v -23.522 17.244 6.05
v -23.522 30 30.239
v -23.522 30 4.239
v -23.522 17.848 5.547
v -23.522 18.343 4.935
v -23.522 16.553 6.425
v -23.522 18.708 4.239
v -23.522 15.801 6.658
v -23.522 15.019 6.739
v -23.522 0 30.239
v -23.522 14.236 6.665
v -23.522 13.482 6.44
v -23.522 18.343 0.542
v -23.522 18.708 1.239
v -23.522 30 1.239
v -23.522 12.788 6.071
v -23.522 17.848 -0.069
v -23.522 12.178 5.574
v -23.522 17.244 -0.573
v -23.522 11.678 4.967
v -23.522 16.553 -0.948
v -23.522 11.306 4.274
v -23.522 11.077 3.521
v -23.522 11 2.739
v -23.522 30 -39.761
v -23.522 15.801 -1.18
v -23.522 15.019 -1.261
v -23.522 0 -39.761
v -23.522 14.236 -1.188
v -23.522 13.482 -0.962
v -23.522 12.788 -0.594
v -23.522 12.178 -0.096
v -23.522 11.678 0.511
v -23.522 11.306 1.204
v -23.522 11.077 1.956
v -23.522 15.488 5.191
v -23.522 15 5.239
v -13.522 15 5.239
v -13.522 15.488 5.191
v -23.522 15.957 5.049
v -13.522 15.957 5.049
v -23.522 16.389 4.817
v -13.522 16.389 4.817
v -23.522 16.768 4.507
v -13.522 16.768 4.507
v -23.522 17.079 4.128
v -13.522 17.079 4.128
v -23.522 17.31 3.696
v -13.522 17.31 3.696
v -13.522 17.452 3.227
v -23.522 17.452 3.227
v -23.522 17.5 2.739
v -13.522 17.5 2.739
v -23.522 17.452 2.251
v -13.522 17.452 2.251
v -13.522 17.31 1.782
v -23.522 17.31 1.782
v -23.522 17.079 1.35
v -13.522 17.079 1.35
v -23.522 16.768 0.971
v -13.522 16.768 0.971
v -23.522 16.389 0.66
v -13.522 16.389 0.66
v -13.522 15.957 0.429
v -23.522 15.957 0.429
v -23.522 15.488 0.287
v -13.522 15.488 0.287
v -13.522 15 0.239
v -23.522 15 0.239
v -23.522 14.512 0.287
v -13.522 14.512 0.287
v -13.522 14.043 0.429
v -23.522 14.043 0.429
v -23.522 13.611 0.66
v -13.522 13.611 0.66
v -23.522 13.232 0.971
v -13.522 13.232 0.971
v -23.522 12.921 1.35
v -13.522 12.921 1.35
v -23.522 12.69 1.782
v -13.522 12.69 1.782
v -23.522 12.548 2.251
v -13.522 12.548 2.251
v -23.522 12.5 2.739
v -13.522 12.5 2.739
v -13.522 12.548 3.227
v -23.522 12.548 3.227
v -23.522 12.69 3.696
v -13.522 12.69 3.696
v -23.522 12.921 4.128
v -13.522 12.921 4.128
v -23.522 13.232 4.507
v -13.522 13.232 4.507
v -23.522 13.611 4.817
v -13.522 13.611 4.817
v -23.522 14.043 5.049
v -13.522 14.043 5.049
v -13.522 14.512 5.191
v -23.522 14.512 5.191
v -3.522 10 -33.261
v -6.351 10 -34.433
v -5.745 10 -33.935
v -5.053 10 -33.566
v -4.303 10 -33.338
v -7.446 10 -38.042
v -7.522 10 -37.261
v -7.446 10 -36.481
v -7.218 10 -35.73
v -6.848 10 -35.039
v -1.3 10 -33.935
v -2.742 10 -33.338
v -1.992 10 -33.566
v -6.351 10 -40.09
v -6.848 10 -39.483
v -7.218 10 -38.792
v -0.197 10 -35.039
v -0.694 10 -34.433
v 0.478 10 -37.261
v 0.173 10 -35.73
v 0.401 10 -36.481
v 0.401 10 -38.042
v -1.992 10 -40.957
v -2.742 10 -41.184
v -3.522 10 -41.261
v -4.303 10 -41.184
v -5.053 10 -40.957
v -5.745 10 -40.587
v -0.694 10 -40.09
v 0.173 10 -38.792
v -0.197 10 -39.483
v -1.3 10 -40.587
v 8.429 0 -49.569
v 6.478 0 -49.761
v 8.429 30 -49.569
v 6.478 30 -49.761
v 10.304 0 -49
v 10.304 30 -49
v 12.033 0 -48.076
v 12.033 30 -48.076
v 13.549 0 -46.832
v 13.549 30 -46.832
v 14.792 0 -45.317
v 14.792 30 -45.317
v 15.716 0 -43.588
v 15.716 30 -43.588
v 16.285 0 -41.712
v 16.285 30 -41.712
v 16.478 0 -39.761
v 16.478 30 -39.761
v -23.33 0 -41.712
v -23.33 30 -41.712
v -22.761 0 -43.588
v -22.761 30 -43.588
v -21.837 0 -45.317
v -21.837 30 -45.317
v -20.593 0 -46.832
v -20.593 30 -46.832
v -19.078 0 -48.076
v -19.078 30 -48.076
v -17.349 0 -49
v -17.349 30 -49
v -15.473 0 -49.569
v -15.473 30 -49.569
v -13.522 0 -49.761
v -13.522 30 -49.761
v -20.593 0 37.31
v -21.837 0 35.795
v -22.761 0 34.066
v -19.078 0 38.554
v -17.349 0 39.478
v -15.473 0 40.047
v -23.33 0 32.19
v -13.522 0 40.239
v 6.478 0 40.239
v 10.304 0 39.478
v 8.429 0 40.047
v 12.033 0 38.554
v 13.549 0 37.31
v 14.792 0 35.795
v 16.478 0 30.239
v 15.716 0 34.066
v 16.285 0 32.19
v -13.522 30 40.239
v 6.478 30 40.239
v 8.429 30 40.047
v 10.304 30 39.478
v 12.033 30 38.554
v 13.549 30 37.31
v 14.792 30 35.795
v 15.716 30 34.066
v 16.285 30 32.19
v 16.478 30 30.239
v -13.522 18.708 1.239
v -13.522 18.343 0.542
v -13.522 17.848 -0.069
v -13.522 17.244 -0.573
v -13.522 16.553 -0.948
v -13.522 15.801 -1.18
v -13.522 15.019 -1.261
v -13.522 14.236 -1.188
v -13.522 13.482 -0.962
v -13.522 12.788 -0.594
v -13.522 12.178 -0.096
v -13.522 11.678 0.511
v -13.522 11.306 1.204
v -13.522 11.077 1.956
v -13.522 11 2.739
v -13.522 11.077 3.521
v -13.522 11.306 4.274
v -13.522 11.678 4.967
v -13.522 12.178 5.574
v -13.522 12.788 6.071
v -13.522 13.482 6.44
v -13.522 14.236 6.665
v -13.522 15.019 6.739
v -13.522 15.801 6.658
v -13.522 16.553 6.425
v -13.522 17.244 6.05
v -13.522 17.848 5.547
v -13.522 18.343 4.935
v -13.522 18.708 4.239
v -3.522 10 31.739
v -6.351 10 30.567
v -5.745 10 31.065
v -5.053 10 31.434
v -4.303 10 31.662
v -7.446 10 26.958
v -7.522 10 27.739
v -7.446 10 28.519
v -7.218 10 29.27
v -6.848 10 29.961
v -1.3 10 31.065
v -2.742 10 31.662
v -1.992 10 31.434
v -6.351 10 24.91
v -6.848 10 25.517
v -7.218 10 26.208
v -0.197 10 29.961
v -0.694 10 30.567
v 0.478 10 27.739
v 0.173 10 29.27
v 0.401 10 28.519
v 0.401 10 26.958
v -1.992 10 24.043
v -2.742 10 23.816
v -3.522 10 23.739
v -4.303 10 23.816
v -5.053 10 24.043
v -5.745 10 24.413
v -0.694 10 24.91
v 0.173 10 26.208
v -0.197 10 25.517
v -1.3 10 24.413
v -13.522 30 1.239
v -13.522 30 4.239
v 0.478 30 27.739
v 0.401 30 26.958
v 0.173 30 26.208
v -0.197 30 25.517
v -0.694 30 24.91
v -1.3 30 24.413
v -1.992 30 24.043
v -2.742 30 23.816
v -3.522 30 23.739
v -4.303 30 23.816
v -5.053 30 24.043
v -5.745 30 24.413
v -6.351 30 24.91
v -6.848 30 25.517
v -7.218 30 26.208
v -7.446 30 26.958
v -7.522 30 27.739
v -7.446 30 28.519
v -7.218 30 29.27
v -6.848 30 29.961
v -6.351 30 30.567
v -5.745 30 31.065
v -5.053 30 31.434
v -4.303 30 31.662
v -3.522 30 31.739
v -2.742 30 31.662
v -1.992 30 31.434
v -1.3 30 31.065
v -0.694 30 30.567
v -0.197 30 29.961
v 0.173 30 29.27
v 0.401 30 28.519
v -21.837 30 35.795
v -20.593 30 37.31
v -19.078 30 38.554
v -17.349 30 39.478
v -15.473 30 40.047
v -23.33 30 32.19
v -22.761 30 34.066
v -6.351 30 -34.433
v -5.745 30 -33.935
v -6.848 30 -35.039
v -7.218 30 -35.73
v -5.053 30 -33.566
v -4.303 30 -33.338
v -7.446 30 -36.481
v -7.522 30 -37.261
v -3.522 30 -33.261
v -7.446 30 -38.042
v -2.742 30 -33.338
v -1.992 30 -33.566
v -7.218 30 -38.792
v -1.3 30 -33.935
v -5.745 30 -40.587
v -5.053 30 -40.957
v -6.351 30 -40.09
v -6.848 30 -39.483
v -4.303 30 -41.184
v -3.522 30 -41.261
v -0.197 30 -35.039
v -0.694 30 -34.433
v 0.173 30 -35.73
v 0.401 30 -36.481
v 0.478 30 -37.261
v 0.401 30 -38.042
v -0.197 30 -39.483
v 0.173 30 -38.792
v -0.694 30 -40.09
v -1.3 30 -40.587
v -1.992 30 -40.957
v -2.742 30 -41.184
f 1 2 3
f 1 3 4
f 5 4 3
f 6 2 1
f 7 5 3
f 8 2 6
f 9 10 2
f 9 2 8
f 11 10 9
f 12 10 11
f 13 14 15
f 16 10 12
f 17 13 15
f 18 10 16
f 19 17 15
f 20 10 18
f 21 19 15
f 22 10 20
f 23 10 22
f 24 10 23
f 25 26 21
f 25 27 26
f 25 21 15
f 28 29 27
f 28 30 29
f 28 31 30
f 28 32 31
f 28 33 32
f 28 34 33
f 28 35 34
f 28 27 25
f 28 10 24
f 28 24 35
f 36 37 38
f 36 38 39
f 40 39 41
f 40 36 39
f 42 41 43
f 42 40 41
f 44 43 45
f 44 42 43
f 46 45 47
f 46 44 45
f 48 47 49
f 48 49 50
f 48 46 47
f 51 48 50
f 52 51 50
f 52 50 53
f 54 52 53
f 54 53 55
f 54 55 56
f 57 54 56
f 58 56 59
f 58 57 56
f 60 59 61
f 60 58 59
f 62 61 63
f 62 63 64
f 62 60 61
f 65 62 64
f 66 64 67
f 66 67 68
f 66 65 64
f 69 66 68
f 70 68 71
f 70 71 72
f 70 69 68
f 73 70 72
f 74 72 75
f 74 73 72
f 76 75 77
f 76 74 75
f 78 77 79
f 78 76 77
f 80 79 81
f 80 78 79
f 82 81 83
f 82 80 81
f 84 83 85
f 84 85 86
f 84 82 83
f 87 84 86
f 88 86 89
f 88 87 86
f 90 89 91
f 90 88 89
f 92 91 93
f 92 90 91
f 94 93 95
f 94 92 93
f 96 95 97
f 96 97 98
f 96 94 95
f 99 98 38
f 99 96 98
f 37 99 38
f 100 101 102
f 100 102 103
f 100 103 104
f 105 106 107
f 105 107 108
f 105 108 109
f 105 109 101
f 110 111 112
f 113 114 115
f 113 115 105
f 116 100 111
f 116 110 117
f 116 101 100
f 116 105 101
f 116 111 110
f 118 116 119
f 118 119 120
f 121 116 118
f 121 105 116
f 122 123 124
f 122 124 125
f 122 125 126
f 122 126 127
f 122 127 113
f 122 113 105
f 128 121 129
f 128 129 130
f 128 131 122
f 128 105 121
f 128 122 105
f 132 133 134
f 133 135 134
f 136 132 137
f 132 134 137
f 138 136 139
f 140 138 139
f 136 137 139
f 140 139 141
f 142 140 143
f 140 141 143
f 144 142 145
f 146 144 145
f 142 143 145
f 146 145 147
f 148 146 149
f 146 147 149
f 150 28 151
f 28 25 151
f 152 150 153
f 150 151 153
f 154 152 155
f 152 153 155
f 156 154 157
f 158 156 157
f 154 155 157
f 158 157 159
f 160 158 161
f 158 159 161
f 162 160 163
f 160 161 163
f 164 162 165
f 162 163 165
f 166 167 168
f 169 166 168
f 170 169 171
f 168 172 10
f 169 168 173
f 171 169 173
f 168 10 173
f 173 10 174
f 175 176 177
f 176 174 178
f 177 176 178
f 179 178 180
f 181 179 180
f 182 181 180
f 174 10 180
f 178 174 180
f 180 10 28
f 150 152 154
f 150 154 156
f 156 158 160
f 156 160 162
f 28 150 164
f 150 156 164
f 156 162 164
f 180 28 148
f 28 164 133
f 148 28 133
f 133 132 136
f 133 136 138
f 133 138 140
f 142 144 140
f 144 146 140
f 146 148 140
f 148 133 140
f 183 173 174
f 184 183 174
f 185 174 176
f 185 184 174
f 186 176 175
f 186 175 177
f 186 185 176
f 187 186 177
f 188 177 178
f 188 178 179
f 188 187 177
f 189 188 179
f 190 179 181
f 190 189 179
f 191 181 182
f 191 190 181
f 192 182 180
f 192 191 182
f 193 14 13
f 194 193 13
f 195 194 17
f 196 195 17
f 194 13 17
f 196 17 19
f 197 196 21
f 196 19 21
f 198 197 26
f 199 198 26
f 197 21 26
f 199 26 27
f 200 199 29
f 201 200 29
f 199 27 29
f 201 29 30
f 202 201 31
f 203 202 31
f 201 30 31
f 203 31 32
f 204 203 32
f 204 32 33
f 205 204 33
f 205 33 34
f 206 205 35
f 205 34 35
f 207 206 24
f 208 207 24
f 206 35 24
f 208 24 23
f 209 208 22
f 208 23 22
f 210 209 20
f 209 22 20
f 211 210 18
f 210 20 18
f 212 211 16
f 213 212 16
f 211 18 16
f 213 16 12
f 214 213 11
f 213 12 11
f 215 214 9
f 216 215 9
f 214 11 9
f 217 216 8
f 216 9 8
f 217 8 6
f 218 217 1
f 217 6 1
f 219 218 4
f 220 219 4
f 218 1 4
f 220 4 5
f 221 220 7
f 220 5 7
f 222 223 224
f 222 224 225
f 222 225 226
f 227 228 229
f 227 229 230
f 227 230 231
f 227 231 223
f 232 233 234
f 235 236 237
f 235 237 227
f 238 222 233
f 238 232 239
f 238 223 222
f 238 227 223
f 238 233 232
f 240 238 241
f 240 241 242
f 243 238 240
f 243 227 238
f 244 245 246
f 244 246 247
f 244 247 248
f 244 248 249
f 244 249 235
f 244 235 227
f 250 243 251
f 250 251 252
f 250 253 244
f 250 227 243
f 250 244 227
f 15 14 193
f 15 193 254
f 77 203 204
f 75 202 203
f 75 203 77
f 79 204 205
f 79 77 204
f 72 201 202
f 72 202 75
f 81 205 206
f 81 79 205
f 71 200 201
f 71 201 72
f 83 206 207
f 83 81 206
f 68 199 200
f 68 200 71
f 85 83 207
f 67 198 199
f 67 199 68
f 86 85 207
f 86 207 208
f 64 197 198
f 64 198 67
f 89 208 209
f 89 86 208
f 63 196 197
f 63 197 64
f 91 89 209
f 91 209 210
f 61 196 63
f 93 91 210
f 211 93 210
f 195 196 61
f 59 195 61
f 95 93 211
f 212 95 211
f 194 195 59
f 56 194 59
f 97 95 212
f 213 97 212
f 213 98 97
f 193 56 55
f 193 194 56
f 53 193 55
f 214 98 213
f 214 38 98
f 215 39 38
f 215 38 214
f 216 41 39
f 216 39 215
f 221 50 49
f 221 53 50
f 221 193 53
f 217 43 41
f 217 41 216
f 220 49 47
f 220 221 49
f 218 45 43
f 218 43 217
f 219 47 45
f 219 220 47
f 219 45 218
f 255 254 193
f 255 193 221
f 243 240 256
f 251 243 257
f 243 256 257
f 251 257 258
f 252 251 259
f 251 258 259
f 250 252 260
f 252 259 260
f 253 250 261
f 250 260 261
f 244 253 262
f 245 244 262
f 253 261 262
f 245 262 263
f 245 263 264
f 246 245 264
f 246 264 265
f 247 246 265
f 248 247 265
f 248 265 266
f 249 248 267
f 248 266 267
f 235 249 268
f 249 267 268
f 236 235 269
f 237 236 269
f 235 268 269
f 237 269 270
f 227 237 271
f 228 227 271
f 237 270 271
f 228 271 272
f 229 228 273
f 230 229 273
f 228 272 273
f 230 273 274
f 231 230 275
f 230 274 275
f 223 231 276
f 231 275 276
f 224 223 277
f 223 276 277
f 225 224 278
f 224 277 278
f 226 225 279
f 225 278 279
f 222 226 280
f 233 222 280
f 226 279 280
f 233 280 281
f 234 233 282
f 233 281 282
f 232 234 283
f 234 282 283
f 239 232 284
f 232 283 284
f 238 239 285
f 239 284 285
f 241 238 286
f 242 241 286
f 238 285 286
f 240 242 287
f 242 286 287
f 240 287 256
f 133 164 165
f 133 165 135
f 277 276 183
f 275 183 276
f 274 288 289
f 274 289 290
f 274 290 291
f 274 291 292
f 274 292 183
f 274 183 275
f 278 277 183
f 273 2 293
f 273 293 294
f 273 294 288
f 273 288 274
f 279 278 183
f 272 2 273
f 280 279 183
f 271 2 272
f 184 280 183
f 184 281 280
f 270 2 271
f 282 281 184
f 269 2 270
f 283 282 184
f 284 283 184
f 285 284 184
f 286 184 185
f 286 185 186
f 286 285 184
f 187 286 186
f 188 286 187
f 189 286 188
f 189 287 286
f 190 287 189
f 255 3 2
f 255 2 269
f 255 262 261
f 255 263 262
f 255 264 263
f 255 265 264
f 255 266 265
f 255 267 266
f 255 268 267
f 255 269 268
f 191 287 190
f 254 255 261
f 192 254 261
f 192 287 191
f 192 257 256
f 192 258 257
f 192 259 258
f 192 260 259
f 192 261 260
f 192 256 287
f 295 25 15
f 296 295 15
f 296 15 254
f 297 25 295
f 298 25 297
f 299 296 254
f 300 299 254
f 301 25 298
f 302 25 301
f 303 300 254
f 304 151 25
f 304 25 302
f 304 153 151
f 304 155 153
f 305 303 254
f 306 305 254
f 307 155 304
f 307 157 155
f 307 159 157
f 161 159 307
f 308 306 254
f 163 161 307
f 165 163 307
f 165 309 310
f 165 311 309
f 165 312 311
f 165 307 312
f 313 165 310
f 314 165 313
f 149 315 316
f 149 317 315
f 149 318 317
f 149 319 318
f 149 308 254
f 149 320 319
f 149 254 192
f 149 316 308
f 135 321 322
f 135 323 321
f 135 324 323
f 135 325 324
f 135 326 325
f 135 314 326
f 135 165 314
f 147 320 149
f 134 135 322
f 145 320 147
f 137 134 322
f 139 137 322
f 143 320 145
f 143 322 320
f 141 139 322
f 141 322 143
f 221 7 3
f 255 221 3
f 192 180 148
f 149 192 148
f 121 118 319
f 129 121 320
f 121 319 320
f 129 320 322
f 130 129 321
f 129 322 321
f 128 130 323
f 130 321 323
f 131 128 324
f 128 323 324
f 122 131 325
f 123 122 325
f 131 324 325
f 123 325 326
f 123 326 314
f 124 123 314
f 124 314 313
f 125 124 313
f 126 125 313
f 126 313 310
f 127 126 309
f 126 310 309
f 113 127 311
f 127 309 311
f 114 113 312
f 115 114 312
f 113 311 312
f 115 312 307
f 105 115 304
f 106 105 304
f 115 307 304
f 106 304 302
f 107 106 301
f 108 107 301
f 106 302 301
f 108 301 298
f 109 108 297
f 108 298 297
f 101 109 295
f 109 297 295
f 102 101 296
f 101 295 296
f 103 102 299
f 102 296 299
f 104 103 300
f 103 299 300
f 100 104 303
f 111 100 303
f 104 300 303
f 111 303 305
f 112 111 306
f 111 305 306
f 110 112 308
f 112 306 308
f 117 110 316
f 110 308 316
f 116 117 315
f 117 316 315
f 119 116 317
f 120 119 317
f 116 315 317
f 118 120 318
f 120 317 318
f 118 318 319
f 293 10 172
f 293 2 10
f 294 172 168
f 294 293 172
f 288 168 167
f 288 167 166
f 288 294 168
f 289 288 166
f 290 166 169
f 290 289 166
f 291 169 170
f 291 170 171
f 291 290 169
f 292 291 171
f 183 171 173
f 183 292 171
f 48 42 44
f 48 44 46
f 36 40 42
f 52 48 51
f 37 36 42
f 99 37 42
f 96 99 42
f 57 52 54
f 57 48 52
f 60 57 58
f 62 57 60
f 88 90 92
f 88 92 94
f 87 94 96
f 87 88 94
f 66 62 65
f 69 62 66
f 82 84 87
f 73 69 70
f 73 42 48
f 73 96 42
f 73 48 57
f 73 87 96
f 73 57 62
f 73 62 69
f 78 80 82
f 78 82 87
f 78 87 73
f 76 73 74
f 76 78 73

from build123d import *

# Parameters (mm, degrees)
SKETCH2_W           = 40
SKETCH2_H           = 90
BOSS_EXTRUDE1_DEPTH = 30
SKETCH3_R           = 4
CUT_EXTRUDE1_DEPTH  = 20
SKETCH4_R           = 4
SKETCH4_R_2         = 2.5
SKETCH4_W           = 3
SKETCH4_H           = 12
CUT_EXTRUDE2_DEPTH  = 10
FILLET1_R           = 10


with BuildPart() as part:
    # Sketch2 → Boss-Extrude1 (new body)
    with BuildSketch(Plane(origin=(0, 0, 0), x_dir=(1, 0, 0), z_dir=(0, 1, 0))):
        with Locations((-3.52238806, 4.76119403)):
            Rectangle(SKETCH2_W, SKETCH2_H)
    extrude(amount=BOSS_EXTRUDE1_DEPTH)

    # Sketch3 → Cut-Extrude1 (cut)
    with BuildSketch(Plane(origin=(0, 30, 0), x_dir=(1, 0, 0), z_dir=(0, 1, 0))):
        with Locations((-3.52238806, 37.26119403)):
            Circle(SKETCH3_R)
        with Locations((-3.52238806, -27.73880597)):
            Circle(SKETCH3_R)
    extrude(amount=-CUT_EXTRUDE1_DEPTH, mode=Mode.SUBTRACT)

    # Sketch4 → Cut-Extrude2 (cut)
    with BuildSketch(Plane.ZY.offset(23.52238806)):
        with Locations((2.73880597, 15)):
            Circle(SKETCH4_R)
        with Locations((2.73880597, 15)):
            Circle(SKETCH4_R_2, mode=Mode.SUBTRACT)
        with Locations((2.73880597, 24)):
            Rectangle(SKETCH4_W, SKETCH4_H)
    extrude(amount=-CUT_EXTRUDE2_DEPTH, mode=Mode.SUBTRACT)

    # Fillet1
    fillet1_edges = [part.edges().sort_by_distance(p)[0] for p in [
        (-23.52238806, 15, -49.76119403),
        (16.47761194, 15, -49.76119403),
        (16.47761194, 15, 40.23880597),
        (-23.52238806, 15, 40.23880597),
    ]]
    fillet(fillet1_edges, radius=FILLET1_R)


solid = part.part
